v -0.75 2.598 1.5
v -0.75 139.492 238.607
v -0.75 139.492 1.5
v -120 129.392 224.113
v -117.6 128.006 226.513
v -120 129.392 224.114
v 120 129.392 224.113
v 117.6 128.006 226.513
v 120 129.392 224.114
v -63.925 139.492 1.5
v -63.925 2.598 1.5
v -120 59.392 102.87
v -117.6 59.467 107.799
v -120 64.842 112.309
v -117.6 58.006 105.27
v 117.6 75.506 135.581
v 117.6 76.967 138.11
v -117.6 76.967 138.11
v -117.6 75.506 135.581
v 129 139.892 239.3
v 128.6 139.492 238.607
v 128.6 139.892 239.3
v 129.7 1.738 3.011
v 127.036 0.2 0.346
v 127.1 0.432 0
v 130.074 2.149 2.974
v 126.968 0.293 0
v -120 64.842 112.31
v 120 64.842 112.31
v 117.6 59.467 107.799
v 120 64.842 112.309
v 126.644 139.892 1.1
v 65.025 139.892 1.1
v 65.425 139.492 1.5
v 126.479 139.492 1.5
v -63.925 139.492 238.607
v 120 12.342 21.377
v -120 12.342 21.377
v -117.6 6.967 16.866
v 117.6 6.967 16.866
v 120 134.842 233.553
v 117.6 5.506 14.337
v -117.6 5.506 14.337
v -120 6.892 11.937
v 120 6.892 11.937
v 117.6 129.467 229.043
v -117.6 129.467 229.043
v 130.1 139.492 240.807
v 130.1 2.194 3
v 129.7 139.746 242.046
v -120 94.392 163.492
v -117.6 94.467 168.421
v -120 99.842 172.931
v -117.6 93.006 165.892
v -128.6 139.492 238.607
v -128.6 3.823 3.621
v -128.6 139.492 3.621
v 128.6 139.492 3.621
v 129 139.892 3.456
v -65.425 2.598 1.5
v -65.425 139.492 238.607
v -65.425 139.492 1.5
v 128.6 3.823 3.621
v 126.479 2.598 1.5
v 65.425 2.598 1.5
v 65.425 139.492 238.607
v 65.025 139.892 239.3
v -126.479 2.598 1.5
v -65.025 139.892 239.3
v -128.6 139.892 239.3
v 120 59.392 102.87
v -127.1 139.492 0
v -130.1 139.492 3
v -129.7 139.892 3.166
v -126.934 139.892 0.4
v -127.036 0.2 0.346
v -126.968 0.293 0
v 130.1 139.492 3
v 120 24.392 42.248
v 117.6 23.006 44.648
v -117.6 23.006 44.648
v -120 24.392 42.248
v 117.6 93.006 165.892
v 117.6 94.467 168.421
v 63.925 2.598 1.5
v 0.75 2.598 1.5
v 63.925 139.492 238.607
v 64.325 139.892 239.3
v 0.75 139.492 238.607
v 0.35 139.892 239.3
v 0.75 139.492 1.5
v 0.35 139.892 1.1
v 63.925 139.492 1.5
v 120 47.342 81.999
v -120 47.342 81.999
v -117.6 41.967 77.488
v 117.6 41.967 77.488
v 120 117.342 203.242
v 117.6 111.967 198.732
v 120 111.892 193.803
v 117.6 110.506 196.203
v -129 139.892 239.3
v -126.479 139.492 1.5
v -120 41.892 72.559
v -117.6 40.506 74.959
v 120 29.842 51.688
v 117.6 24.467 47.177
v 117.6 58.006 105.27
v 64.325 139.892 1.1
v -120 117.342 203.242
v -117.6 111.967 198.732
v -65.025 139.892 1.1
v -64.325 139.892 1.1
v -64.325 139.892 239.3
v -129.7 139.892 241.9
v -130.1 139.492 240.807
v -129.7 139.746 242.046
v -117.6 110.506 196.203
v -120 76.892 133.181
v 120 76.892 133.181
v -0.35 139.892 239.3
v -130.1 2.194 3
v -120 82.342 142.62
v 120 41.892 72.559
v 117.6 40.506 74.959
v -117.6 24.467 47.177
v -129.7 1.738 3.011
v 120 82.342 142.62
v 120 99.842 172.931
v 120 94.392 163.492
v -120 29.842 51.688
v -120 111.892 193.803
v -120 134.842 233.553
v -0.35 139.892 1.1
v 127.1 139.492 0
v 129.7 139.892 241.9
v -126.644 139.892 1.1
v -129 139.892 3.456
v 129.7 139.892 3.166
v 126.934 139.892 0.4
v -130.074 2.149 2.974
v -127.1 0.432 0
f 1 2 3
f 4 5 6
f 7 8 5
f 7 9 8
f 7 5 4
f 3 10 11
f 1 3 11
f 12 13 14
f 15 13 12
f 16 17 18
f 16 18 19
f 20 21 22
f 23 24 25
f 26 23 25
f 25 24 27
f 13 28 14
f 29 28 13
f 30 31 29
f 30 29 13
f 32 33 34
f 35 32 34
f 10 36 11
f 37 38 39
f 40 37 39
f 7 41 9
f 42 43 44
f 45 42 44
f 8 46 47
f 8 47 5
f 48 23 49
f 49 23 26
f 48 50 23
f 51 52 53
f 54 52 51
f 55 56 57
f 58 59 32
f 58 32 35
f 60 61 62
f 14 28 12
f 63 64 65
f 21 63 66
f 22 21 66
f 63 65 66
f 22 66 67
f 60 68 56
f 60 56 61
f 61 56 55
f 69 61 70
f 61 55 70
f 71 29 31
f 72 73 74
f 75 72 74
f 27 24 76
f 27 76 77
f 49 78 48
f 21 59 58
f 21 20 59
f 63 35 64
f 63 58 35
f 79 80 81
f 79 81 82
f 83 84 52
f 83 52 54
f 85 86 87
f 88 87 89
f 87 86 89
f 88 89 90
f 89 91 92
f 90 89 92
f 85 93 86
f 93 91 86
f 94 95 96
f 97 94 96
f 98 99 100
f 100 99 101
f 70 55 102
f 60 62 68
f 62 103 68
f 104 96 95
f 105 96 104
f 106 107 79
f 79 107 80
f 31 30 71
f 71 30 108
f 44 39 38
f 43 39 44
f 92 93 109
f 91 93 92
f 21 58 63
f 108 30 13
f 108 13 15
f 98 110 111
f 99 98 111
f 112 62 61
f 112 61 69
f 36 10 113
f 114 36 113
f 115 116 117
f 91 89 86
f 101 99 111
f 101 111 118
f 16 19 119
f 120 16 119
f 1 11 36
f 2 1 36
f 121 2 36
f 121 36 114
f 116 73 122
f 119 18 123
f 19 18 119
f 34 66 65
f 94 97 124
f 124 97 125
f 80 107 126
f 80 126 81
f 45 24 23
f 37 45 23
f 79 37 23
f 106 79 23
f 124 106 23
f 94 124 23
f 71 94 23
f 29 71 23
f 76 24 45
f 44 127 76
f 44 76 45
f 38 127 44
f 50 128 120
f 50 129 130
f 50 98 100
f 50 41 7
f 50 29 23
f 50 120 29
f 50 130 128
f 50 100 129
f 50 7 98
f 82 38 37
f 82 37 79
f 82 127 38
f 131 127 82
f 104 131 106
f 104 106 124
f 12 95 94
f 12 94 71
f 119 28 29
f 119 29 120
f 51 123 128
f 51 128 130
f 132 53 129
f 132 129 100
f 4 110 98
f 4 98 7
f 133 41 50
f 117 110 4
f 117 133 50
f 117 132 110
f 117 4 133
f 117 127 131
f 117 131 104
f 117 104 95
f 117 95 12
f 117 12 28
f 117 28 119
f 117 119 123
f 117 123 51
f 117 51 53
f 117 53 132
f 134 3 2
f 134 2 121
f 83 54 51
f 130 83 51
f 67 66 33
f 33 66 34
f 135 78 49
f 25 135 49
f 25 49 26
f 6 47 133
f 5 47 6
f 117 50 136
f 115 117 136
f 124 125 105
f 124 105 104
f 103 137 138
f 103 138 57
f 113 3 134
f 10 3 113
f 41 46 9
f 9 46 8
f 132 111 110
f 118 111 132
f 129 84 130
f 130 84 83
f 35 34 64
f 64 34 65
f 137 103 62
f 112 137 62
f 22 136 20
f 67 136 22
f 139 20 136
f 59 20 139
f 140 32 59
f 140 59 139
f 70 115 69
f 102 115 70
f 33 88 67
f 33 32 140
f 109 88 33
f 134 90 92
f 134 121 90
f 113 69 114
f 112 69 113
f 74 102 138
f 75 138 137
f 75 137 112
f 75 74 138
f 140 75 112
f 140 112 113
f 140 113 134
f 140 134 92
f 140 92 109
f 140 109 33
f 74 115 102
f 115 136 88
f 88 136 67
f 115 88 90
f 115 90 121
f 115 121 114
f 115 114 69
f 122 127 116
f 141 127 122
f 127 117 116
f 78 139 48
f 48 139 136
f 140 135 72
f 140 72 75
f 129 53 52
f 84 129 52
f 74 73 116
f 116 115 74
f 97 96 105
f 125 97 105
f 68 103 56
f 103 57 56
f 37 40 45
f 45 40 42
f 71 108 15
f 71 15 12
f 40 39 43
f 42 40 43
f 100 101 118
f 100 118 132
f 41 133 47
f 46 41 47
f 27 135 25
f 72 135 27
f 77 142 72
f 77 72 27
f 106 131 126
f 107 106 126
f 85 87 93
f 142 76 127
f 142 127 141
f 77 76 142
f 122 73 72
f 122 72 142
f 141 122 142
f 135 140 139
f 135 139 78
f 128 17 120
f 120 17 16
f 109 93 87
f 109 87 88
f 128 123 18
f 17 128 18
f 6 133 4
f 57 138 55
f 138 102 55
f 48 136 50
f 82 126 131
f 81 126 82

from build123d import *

# Parameters (mm, degrees)
BOSS_EXTRUDE1_DEPTH                = 130.100001
BOSS_EXTRUDE1_DEPTH_BACK           = 130.100001
BACK_CORNER_CHAMS_SIZE             = 3
COMPARTMENT_T                      = -1.5
STACKER_RIB_DEPTH                  = 120.000001
STACKER_RIB_CHAM_SIZE              = 2.4
LPATTERN1_COUNT                    = 8
LPATTERN1_PITCH                    = 35
STACKER_RIB_CHAM_OF_LPATTERN1_SIZE = 2.4
CENTER_DIVIDER_DEPTH               = 0.75
F_4_COMPARTMENT_LEFT_DIVIDER_DEPTH = 0.75
F_4_COMPARTMENT_DEBURS_SIZE        = 0.4


# Some blends are built 0.0001 mm under size
with BuildPart() as part:
    # Sketch1 → Boss-Extrude1 (new, two sides: drawn at the far end of the back side and taken through both)
    with BuildSketch(Plane(origin=(0, 0, 0), x_dir=(0, 0, -1), z_dir=(1, 0, 0)).offset(-BOSS_EXTRUDE1_DEPTH_BACK)):
        Polygon((0, 139.891970225), (0, 0), (-242.3, 139.891970225), align=None)
    extrude(amount=BOSS_EXTRUDE1_DEPTH + BOSS_EXTRUDE1_DEPTH_BACK)

    # Back Corner Chams
    back_corner_chams_edges = [part.edges().sort_by_distance(p)[0] for p in [
        (-130.100001, 69.945985112, 0),
        (130.100001, 69.945985112, 0),
    ]]
    chamfer(back_corner_chams_edges, length=BACK_CORNER_CHAMS_SIZE)

    # Compartment
    compartment_openings = [part.faces().sort_by_distance(p)[0] for p in [
        (0, 139.891970225, 121.167154086),
    ]]
    offset(amount=COMPARTMENT_T, openings=compartment_openings, kind=Kind.INTERSECTION)

    # Sketch7 → Stacker Rib (add, symmetric)
    with BuildSketch(Plane(origin=(0, 0, 0), x_dir=(0, 0, -1), z_dir=(1, 0, 0))):
        Polygon((-233.553143422, 134.841970225), (-229.042618842, 129.466536352), (-226.513466521, 128.006329579), (-224.113466521, 129.391970225), align=None)
    stacker_rib = extrude(amount=STACKER_RIB_DEPTH, both=True)

    # Stacker Rib Cham
    stacker_rib_cham_edges = [part.edges().sort_by_distance(p)[0] for p in [
        (120.000001, 128.736432965, 227.778042681),
        (-120.000001, 128.736432965, 227.778042681),
    ]]
    chamfer(stacker_rib_cham_edges, length=STACKER_RIB_CHAM_SIZE - 0.0001)  # a hair under: the kernel refuses the full size

    # LPattern1: Stacker Rib ×8
    with Locations(*[Vector(-2.642697158742682e-15, -0.5000000000000042, -0.8660254037844363) * (i * LPATTERN1_PITCH) for i in range(1, LPATTERN1_COUNT)]):
        add(stacker_rib)

    # Stacker Rib Cham of LPattern1
    stacker_rib_cham_of_lpattern1_edges = [part.edges().sort_by_distance(p)[0] for p in [
        (120.000001, 111.236432965, 197.467153549),
        (-120.000001, 111.236432965, 197.467153549),
        (120.000001, 93.736432965, 167.156264416),
        (-120.000001, 93.736432965, 167.156264416),
        (120.000001, 76.236432965, 136.845375284),
        (-120.000001, 76.236432965, 136.845375284),
        (120.000001, 58.736432965, 106.534486151),
        (-120.000001, 58.736432965, 106.534486151),
        (120.000001, 41.236432965, 76.223597019),
        (-120.000001, 41.236432965, 76.223597019),
        (120.000001, 23.736432965, 45.912707887),
        (-120.000001, 23.736432965, 45.912707887),
        (120.000001, 6.236432965, 15.601818754),
        (-120.000001, 6.236432965, 15.601818754),
    ]]
    chamfer(stacker_rib_cham_of_lpattern1_edges, length=STACKER_RIB_CHAM_OF_LPATTERN1_SIZE - 0.0001)  # a hair under: the kernel refuses the full size

    # Sketch3 → Center Divider (add, symmetric)
    with BuildSketch(Plane(origin=(0, 0, 0), x_dir=(0, 0, -1), z_dir=(1, 0, 0))):
        Polygon((0, 0), (0, 139.891970225), (-242.3, 139.891970225), align=None)
    extrude(amount=CENTER_DIVIDER_DEPTH, both=True)

    # Sketch6 → 4 Compartment Left Divider (add, symmetric)
    with BuildSketch(Plane(origin=(-64.67500064, 0, 0), x_dir=(0, 0, -1), z_dir=(1, 0, 0))):
        Polygon((0, 0), (0, 139.891970225), (-242.3, 139.891970225), align=None)
    f_4_compartment_left_divider = extrude(amount=F_4_COMPARTMENT_LEFT_DIVIDER_DEPTH, both=True)

    # 4 Compartment Right Divider: 4 Compartment Left Divider across plane
    add(f_4_compartment_left_divider.mirror(Plane(origin=(0, 0, 0), x_dir=(0, 0, 1), z_dir=(1, 0, 0))))

    # Body Deburs
    # the kernel refuses this chamfer: 0.4, 0.310325843, 0.292820323 mm, written as the material it takes off along each edge
    with BuildSketch(Plane(origin=(129.833334333, 139.709833504, 241.584529946), x_dir=(0.30151134457777734, -0.1911505329331018, -0.9341051240895171), z_dir=(0.9351131265310314, 0.25056280708570355, 0.25056280708575224))) as body_deburs_piece_1:
        Polygon((-0.478475339, -0.058726892), (0.848174577, -0.058726892), (-0.369699238, 0.117453784), align=None)
    extrude(amount=0.521697411, mode=Mode.SUBTRACT)
    with BuildSketch(Plane(origin=(-129.833334333, 139.709833504, 241.584529946), x_dir=(-0.30151134457777734, -0.1911505329331018, -0.9341051240895171), z_dir=(-0.9351131265310314, 0.25056280708570355, 0.25056280708575224))) as body_deburs_piece_2:
        Polygon((-0.478475339, 0.058726892), (0.848174577, 0.058726892), (-0.369699238, -0.117453784), align=None)
    extrude(amount=0.521697411, mode=Mode.SUBTRACT)
    with BuildSketch(Plane(origin=(127.507353852, 139.891970225, 1.5), x_dir=(0, 0.02749587661059753, -0.9996219169112964), z_dir=(-1, 0, 0))) as body_deburs_piece_3_section:
        with BuildLine():
            Line((0.411469278, 0), (-0.022618862, 0.410847117))
            Line((-0.022618862, 0.410847117), (-0.030615837, 0.41062715))
            ThreePointArc((-0.030615837, 0.41062715), (-0.013651691, 0.205359132), (-0.007996975, -0.000219967))
            Line((-0.007996975, -0.000219967), (0.000219967, -0.007996975))
            ThreePointArc((0.000219967, -0.007996975), (0.205799066, -0.00234226), (0.411689245, -0.007996975))
            Line((0.411689245, -0.007996975), (0.411469278, 0))
        make_face()
    body_deburs_piece_3 = extrude(amount=62.082353212, mode=Mode.PRIVATE)
    body_deburs_piece_3 = split(body_deburs_piece_3, bisect_by=Plane(origin=(111.116447648, 139.759963614, -13.862233009), z_dir=(-0.7071067811865476, 0, 0.7071067811865476)), keep=Keep.TOP, mode=Mode.PRIVATE)
    add(body_deburs_piece_3, mode=Mode.SUBTRACT)
    with BuildSketch(Plane(origin=(125.751298864, 139.891970225, 0.772618208), x_dir=(0.7068394360706732, 0.027495876610596933, -0.7068394360706733), z_dir=(0.7071067811865476, 0, 0.7071067811865476))) as body_deburs_piece_4_section:
        with BuildLine():
            Line((0.411469278, 0), (-0.022618862, -0.410847117))
            Line((-0.022618862, -0.410847117), (-0.030615837, -0.41062715))
            ThreePointArc((-0.030615837, -0.41062715), (-0.013651691, -0.205359132), (-0.007996975, 0.000219967))
            Line((-0.007996975, 0.000219967), (0.000219967, 0.007996975))
            ThreePointArc((0.000219967, 0.007996975), (0.205799066, 0.00234226), (0.411689245, 0.007996975))
            Line((0.411689245, 0.007996975), (0.411469278, 0))
        make_face()
    body_deburs_piece_4 = extrude(amount=5.05734639, mode=Mode.PRIVATE)
    body_deburs_piece_4 = split(body_deburs_piece_4, bisect_by=Plane(origin=(128.600001, 139.756082402, 2.472631953), z_dir=(-1, 0, 0)), keep=Keep.TOP, mode=Mode.PRIVATE)
    body_deburs_piece_4 = split(body_deburs_piece_4, bisect_by=Plane(origin=(127.627369047, 139.756082402, 1.5), z_dir=(0, 0, 1)), keep=Keep.TOP, mode=Mode.PRIVATE)
    add(body_deburs_piece_4, mode=Mode.SUBTRACT)
    with BuildSketch(Plane(origin=(128.600001, 139.891970225, 2.592647148), x_dir=(0.9996219169112964, 0.027495876610595334, 0), z_dir=(0, 0, 1))) as body_deburs_piece_5_section:
        with BuildLine():
            Line((0.411469278, 0), (-0.022618862, -0.410847117))
            Line((-0.022618862, -0.410847117), (-0.030615837, -0.41062715))
            ThreePointArc((-0.030615837, -0.41062715), (-0.013651691, -0.205359132), (-0.007996975, 0.000219967))
            Line((-0.007996975, 0.000219967), (0.000219967, 0.007996975))
            ThreePointArc((0.000219967, 0.007996975), (0.205799066, 0.00234226), (0.411689245, 0.007996975))
            Line((0.411689245, 0.007996975), (0.411469278, 0))
        make_face()
    body_deburs_piece_5 = extrude(amount=237.736026047, mode=Mode.PRIVATE)
    body_deburs_piece_5 = split(body_deburs_piece_5, bisect_by=Plane(origin=(128.731915254, 88.812183478, 150.827214114), z_dir=(0, 0.8660254037844364, -0.5000000000000039)), keep=Keep.TOP, mode=Mode.PRIVATE)
    body_deburs_piece_5 = split(body_deburs_piece_5, bisect_by=Plane(origin=(187.561507061, 139.760104476, 62.582826404), z_dir=(-0.7071067811865476, 0, 0.7071067811865476)), keep=Keep.TOP, mode=Mode.PRIVATE)
    add(body_deburs_piece_5, mode=Mode.SUBTRACT)
    with BuildSketch(Plane(origin=(-125.751298864, 139.891970225, 0.772618208), x_dir=(-0.7068394360706732, 0.027495876610596933, -0.7068394360706733), z_dir=(-0.7071067811865476, 0, 0.7071067811865476))) as body_deburs_piece_6_section:
        with BuildLine():
            Line((0.411469278, 0), (-0.022618862, 0.410847117))
            Line((-0.022618862, 0.410847117), (-0.030615837, 0.41062715))
            ThreePointArc((-0.030615837, 0.41062715), (-0.013651691, 0.205359132), (-0.007996975, -0.000219967))
            Line((-0.007996975, -0.000219967), (0.000219967, -0.007996975))
            ThreePointArc((0.000219967, -0.007996975), (0.205799066, -0.00234226), (0.411689245, -0.007996975))
            Line((0.411689245, -0.007996975), (0.411469278, 0))
        make_face()
    body_deburs_piece_6 = extrude(amount=5.05734639, mode=Mode.PRIVATE)
    body_deburs_piece_6 = split(body_deburs_piece_6, bisect_by=Plane(origin=(-128.600001, 139.756082402, 2.472631953), z_dir=(1, 0, 0)), keep=Keep.TOP, mode=Mode.PRIVATE)
    body_deburs_piece_6 = split(body_deburs_piece_6, bisect_by=Plane(origin=(-127.627369047, 139.756082402, 1.5), z_dir=(0, 0, 1)), keep=Keep.TOP, mode=Mode.PRIVATE)
    add(body_deburs_piece_6, mode=Mode.SUBTRACT)
    with BuildSketch(Plane(origin=(-128.600001, 139.891970225, 2.592647148), x_dir=(-0.9996219169112964, 0.027495876610595334, 0), z_dir=(0, 0, 1))) as body_deburs_piece_7_section:
        with BuildLine():
            Line((0.411469278, 0), (-0.022618862, 0.410847117))
            Line((-0.022618862, 0.410847117), (-0.030615837, 0.41062715))
            ThreePointArc((-0.030615837, 0.41062715), (-0.013651691, 0.205359132), (-0.007996975, -0.000219967))
            Line((-0.007996975, -0.000219967), (0.000219967, -0.007996975))
            ThreePointArc((0.000219967, -0.007996975), (0.205799066, -0.00234226), (0.411689245, -0.007996975))
            Line((0.411689245, -0.007996975), (0.411469278, 0))
        make_face()
    body_deburs_piece_7 = extrude(amount=237.736026047, mode=Mode.PRIVATE)
    body_deburs_piece_7 = split(body_deburs_piece_7, bisect_by=Plane(origin=(-128.731915254, 88.812183478, 150.827214114), z_dir=(0, 0.8660254037844364, -0.5000000000000039)), keep=Keep.TOP, mode=Mode.PRIVATE)
    body_deburs_piece_7 = split(body_deburs_piece_7, bisect_by=Plane(origin=(-187.561507061, 139.760104476, 62.582826404), z_dir=(0.7071067811865476, 0, 0.7071067811865476)), keep=Keep.TOP, mode=Mode.PRIVATE)
    add(body_deburs_piece_7, mode=Mode.SUBTRACT)
    with BuildSketch(Plane(origin=(130.100001, 1.21771421, 2.109142881), x_dir=(-0.9996219169112966, -0.02381212764408988, 0.013747938305293163), z_dir=(0, 0.5000000000000039, 0.8660254037844364))) as body_deburs_piece_8:
        with BuildLine():
            Line((0.411469278, 0), (-0.022618862, -0.410847117))
            Line((-0.022618862, -0.410847117), (-0.030615837, -0.41062715))
            ThreePointArc((-0.030615837, -0.41062715), (-0.013651691, -0.205359132), (-0.007996975, 0.000219967))
            Line((-0.007996975, 0.000219967), (0.000219967, 0.007996975))
            ThreePointArc((0.000219967, 0.007996975), (0.205799066, 0.00234226), (0.411689245, 0.007996975))
            Line((0.411689245, 0.007996975), (0.411469278, 0))
        make_face()
    extrude(amount=278.377185225, mode=Mode.SUBTRACT)
    with BuildSketch(Plane(origin=(130.100001, 139.891970225, 243.328673195), x_dir=(-0.9996219169112964, 0.027495876610595334, 0), z_dir=(0, 0, -1)), Plane(origin=(-130.100001, 139.891970225, 243.328673195), x_dir=(-0.027495876610595337, -0.9996219169112965, 0), z_dir=(0, 0, -1))) as body_deburs_piece_9:
        with BuildLine():
            Line((0.411469278, 0), (-0.022618862, -0.410847117))
            Line((-0.022618862, -0.410847117), (-0.030615837, -0.41062715))
            ThreePointArc((-0.030615837, -0.41062715), (-0.013651691, -0.205359132), (-0.007996975, 0.000219967))
            Line((-0.007996975, 0.000219967), (0.000219967, 0.007996975))
            ThreePointArc((0.000219967, 0.007996975), (0.205799066, 0.00234226), (0.411689245, 0.007996975))
            Line((0.411689245, 0.007996975), (0.411469278, 0))
        make_face()
    extrude(amount=241.35734639, mode=Mode.SUBTRACT)
    with BuildSketch(Plane(origin=(126.372619208, 139.891970225, -0.727381792), x_dir=(-0.7068394360706732, 0.027495876610595566, 0.7068394360706733), z_dir=(0.7071067811865476, 0, 0.7071067811865476)), Plane(origin=(-126.372619208, 139.891970225, -0.727381792), x_dir=(-0.01944252080601816, -0.9996219169112965, -0.019442520806018278), z_dir=(-0.7071067811865476, 0, 0.7071067811865476))) as body_deburs_piece_10:
        with BuildLine():
            Line((0.411469278, 0), (-0.022618862, 0.410847117))
            Line((-0.022618862, 0.410847117), (-0.030615837, 0.41062715))
            ThreePointArc((-0.030615837, 0.41062715), (-0.013651691, 0.205359132), (-0.007996975, -0.000219967))
            Line((-0.007996975, -0.000219967), (0.000219967, -0.007996975))
            ThreePointArc((0.000219967, -0.007996975), (0.205799066, -0.00234226), (0.411689245, -0.007996975))
            Line((0.411689245, -0.007996975), (0.411469278, 0))
        make_face()
    extrude(amount=6.299987077, mode=Mode.SUBTRACT)
    with BuildSketch(Plane(origin=(-128.128674195, 139.891970225, 0), x_dir=(0, -0.9996219169112966, -0.027495876610585723), z_dir=(1, 0, 0))) as body_deburs_piece_11:
        with BuildLine():
            Line((0.411469278, 0), (-0.022618862, -0.410847117))
            Line((-0.022618862, -0.410847117), (-0.030615837, -0.41062715))
            ThreePointArc((-0.030615837, -0.41062715), (-0.013651691, -0.205359132), (-0.007996975, 0.000219967))
            Line((-0.007996975, 0.000219967), (0.000219967, 0.007996975))
            ThreePointArc((0.000219967, 0.007996975), (0.205799066, 0.00234226), (0.411689245, 0.007996975))
            Line((0.411689245, 0.007996975), (0.411469278, 0))
        make_face()
    extrude(amount=256.25734839, mode=Mode.SUBTRACT)
    with BuildSketch(Plane(origin=(-130.100001, 1.21771421, 2.109142881), x_dir=(0.9996219169112966, -0.02381212764408988, 0.013747938305293163), z_dir=(0, 0.5000000000000039, 0.8660254037844364))) as body_deburs_piece_12:
        with BuildLine():
            Line((0.411469278, 0), (-0.022618862, 0.410847117))
            Line((-0.022618862, 0.410847117), (-0.030615837, 0.41062715))
            ThreePointArc((-0.030615837, 0.41062715), (-0.013651691, 0.205359132), (-0.007996975, -0.000219967))
            Line((-0.007996975, -0.000219967), (0.000219967, -0.007996975))
            ThreePointArc((0.000219967, -0.007996975), (0.205799066, -0.00234226), (0.411689245, -0.007996975))
            Line((0.411689245, -0.007996975), (0.411469278, 0))
        make_face()
    extrude(amount=278.377185225, mode=Mode.SUBTRACT)
    with BuildSketch(Plane(origin=(131.128674195, 139.891970225, 242.3), x_dir=(0, -0.5455824869680519, -0.8380571280728751), z_dir=(-1, 0, 0))) as body_deburs_piece_13:
        with BuildLine():
            Line((0.289092619, 0), (0.338531824, -0.23388709))
            Line((0.338531824, -0.23388709), (0.334167164, -0.240591547))
            ThreePointArc((0.334167164, -0.240591547), (0.167987533, -0.118907235), (-0.00436466, -0.006704457))
            Line((-0.00436466, -0.006704457), (0.000427678, 0.00798856))
            ThreePointArc((0.000427678, 0.00798856), (0.144560882, 0.000272204), (0.289520297, 0.00798856))
            Line((0.289520297, 0.00798856), (0.289092619, 0))
        make_face()
    extrude(amount=262.25734839, mode=Mode.SUBTRACT)
    with BuildSketch(Plane(origin=(126.426576317, -0.388801922, -0.673424683), x_dir=(-0.7551298715314874, 0.28717157801696425, 0.5893312836597817), z_dir=(0.6546536707079762, 0.3779644730092306, 0.6546536707079762))) as body_deburs_piece_14:
        with BuildLine():
            Line((0.3172442, 0), (0.116825908, -0.394536024))
            Line((0.116825908, -0.394536024), (0.109220487, -0.39701747))
            ThreePointArc((0.109220487, -0.39701747), (0.056185378, -0.197994811), (-0.007605421, -0.002481446))
            Line((-0.007605421, -0.002481446), (0.000367742, 0.007991543))
            ThreePointArc((0.000367742, 0.007991543), (0.158654668, 0.000707748), (0.317611942, 0.007991543))
            Line((0.317611942, 0.007991543), (0.3172442, 0))
        make_face()
    extrude(amount=6.639922085, mode=Mode.SUBTRACT)
    with BuildSketch(Plane(origin=(-126.426576317, -0.388801922, -0.673424683), x_dir=(0.7551298715314874, 0.2871715780169642, 0.5893312836597817), z_dir=(-0.6546536707079762, 0.3779644730092306, 0.6546536707079762))) as body_deburs_piece_15:
        with BuildLine():
            Line((0.3172442, 0), (0.116825908, 0.394536024))
            Line((0.116825908, 0.394536024), (0.109220487, 0.39701747))
            ThreePointArc((0.109220487, 0.39701747), (0.056185378, 0.197994811), (-0.007605421, 0.002481446))
            Line((-0.007605421, 0.002481446), (0.000367742, -0.007991543))
            ThreePointArc((0.000367742, -0.007991543), (0.158654668, -0.000707748), (0.317611942, -0.007991543))
            Line((0.317611942, -0.007991543), (0.3172442, 0))
        make_face()
    extrude(amount=6.639922085, mode=Mode.SUBTRACT)
    with BuildSketch(Plane(origin=(-128.128674195, 0, 0), x_dir=(0, 0.47599883081156275, 0.879445912530171), z_dir=(1, 0, 0))) as body_deburs_piece_16:
        with BuildLine():
            Line((0.411469278, 0), (0.12776162, -0.268517987))
            Line((0.12776162, -0.268517987), (0.120726053, -0.272325977))
            ThreePointArc((0.120726053, -0.272325977), (0.063641079, -0.134388748), (-0.007035567, -0.003807991))
            Line((-0.007035567, -0.003807991), (0.000219967, 0.007996975))
            ThreePointArc((0.000219967, 0.007996975), (0.205799066, 0.00234226), (0.411689245, 0.007996975))
            Line((0.411689245, 0.007996975), (0.411469278, 0))
        make_face()
    extrude(amount=256.25734839, mode=Mode.SUBTRACT)
    with BuildSketch(Plane(origin=(127.507353852, 139.891970225, 1.5), x_dir=(0, 0.02749587661059753, -0.9996219169112964), z_dir=(-1, 0, 0))) as body_deburs_piece_17a_section:
        with BuildLine():
            Line((0.411469278, 0), (-0.022618862, 0.410847117))
            Line((-0.022618862, 0.410847117), (-0.030615837, 0.41062715))
            ThreePointArc((-0.030615837, 0.41062715), (-0.013651691, 0.205359132), (-0.007996975, -0.000219967))
            Line((-0.007996975, -0.000219967), (0.000219967, -0.007996975))
            ThreePointArc((0.000219967, -0.007996975), (0.205799066, -0.00234226), (0.411689245, -0.007996975))
            Line((0.411689245, -0.007996975), (0.411469278, 0))
        make_face()
    body_deburs_piece_17a = extrude(amount=62.082353212, mode=Mode.PRIVATE)
    body_deburs_piece_17a = split(body_deburs_piece_17a, bisect_by=Plane(origin=(126.630344982, 139.764732975, 1.651664325), z_dir=(0.7071067811865476, 0, -0.7071067811865476)), keep=Keep.TOP, mode=Mode.PRIVATE)
    with BuildSketch(Plane(origin=(125.751298864, 139.891970225, 0.772618208), x_dir=(0.7068394360706732, 0.027495876610596933, -0.7068394360706733), z_dir=(0.7071067811865476, 0, 0.7071067811865476))) as body_deburs_piece_17b_section:
        with BuildLine():
            Line((0.411469278, 0), (-0.022618862, -0.410847117))
            Line((-0.022618862, -0.410847117), (-0.030615837, -0.41062715))
            ThreePointArc((-0.030615837, -0.41062715), (-0.013651691, -0.205359132), (-0.007996975, 0.000219967))
            Line((-0.007996975, 0.000219967), (0.000219967, 0.007996975))
            ThreePointArc((0.000219967, 0.007996975), (0.205799066, 0.00234226), (0.411689245, 0.007996975))
            Line((0.411689245, 0.007996975), (0.411469278, 0))
        make_face()
    body_deburs_piece_17b = extrude(amount=5.05734639, mode=Mode.PRIVATE)
    body_deburs_piece_17b = split(body_deburs_piece_17b, bisect_by=Plane(origin=(126.264194911, 139.764732975, 1.5), z_dir=(0, 0, -1)), keep=Keep.TOP, mode=Mode.PRIVATE)
    body_deburs_piece_17 = body_deburs_piece_17a & body_deburs_piece_17b
    add(body_deburs_piece_17, mode=Mode.SUBTRACT)
    with BuildSketch(Plane(origin=(125.751298864, 139.891970225, 0.772618208), x_dir=(0.7068394360706732, 0.027495876610596933, -0.7068394360706733), z_dir=(0.7071067811865476, 0, 0.7071067811865476))) as body_deburs_piece_18a_section:
        with BuildLine():
            Line((0.411469278, 0), (-0.022618862, -0.410847117))
            Line((-0.022618862, -0.410847117), (-0.030615837, -0.41062715))
            ThreePointArc((-0.030615837, -0.41062715), (-0.013651691, -0.205359132), (-0.007996975, 0.000219967))
            Line((-0.007996975, 0.000219967), (0.000219967, 0.007996975))
            ThreePointArc((0.000219967, 0.007996975), (0.205799066, 0.00234226), (0.411689245, 0.007996975))
            Line((0.411689245, 0.007996975), (0.411469278, 0))
        make_face()
    body_deburs_piece_18a = extrude(amount=5.05734639, mode=Mode.PRIVATE)
    body_deburs_piece_18a = split(body_deburs_piece_18a, bisect_by=Plane(origin=(128.600001, 139.764732975, 3.835806089), z_dir=(1, 0, 0)), keep=Keep.TOP, mode=Mode.PRIVATE)
    with BuildSketch(Plane(origin=(128.600001, 139.891970225, 2.592647148), x_dir=(0.9996219169112964, 0.027495876610595334, 0), z_dir=(0, 0, 1))) as body_deburs_piece_18b_section:
        with BuildLine():
            Line((0.411469278, 0), (-0.022618862, -0.410847117))
            Line((-0.022618862, -0.410847117), (-0.030615837, -0.41062715))
            ThreePointArc((-0.030615837, -0.41062715), (-0.013651691, -0.205359132), (-0.007996975, 0.000219967))
            Line((-0.007996975, 0.000219967), (0.000219967, 0.007996975))
            ThreePointArc((0.000219967, 0.007996975), (0.205799066, 0.00234226), (0.411689245, 0.007996975))
            Line((0.411689245, 0.007996975), (0.411469278, 0))
        make_face()
    body_deburs_piece_18b = extrude(amount=237.736026047, mode=Mode.PRIVATE)
    body_deburs_piece_18b = split(body_deburs_piece_18b, bisect_by=Plane(origin=(128.448336675, 139.764732975, 3.469656018), z_dir=(0.7071067811865476, 0, -0.7071067811865476)), keep=Keep.TOP, mode=Mode.PRIVATE)
    body_deburs_piece_18 = body_deburs_piece_18a & body_deburs_piece_18b
    add(body_deburs_piece_18, mode=Mode.SUBTRACT)
    with BuildSketch(Plane(origin=(-125.751298864, 139.891970225, 0.772618208), x_dir=(-0.7068394360706732, 0.027495876610596933, -0.7068394360706733), z_dir=(-0.7071067811865476, 0, 0.7071067811865476))) as body_deburs_piece_19a_section:
        with BuildLine():
            Line((0.411469278, 0), (-0.022618862, 0.410847117))
            Line((-0.022618862, 0.410847117), (-0.030615837, 0.41062715))
            ThreePointArc((-0.030615837, 0.41062715), (-0.013651691, 0.205359132), (-0.007996975, -0.000219967))
            Line((-0.007996975, -0.000219967), (0.000219967, -0.007996975))
            ThreePointArc((0.000219967, -0.007996975), (0.205799066, -0.00234226), (0.411689245, -0.007996975))
            Line((0.411689245, -0.007996975), (0.411469278, 0))
        make_face()
    body_deburs_piece_19a = extrude(amount=5.05734639, mode=Mode.PRIVATE)
    body_deburs_piece_19a = split(body_deburs_piece_19a, bisect_by=Plane(origin=(-128.600001, 139.764732975, 3.835806089), z_dir=(-1, 0, 0)), keep=Keep.TOP, mode=Mode.PRIVATE)
    with BuildSketch(Plane(origin=(-128.600001, 139.891970225, 2.592647148), x_dir=(-0.9996219169112964, 0.027495876610595334, 0), z_dir=(0, 0, 1))) as body_deburs_piece_19b_section:
        with BuildLine():
            Line((0.411469278, 0), (-0.022618862, 0.410847117))
            Line((-0.022618862, 0.410847117), (-0.030615837, 0.41062715))
            ThreePointArc((-0.030615837, 0.41062715), (-0.013651691, 0.205359132), (-0.007996975, -0.000219967))
            Line((-0.007996975, -0.000219967), (0.000219967, -0.007996975))
            ThreePointArc((0.000219967, -0.007996975), (0.205799066, -0.00234226), (0.411689245, -0.007996975))
            Line((0.411689245, -0.007996975), (0.411469278, 0))
        make_face()
    body_deburs_piece_19b = extrude(amount=237.736026047, mode=Mode.PRIVATE)
    body_deburs_piece_19b = split(body_deburs_piece_19b, bisect_by=Plane(origin=(-128.448336675, 139.764732975, 3.469656018), z_dir=(-0.7071067811865476, 0, -0.7071067811865476)), keep=Keep.TOP, mode=Mode.PRIVATE)
    body_deburs_piece_19 = body_deburs_piece_19a & body_deburs_piece_19b
    add(body_deburs_piece_19, mode=Mode.SUBTRACT)

    # 4 Compartment Deburs
    f_4_compartment_deburs_edges = [part.edges().sort_by_distance(p)[0] for p in [
        (65.42500064, 139.891970225, 120.2),
        (63.92500064, 139.891970225, 120.4),
        (32.33750032, 139.891970225, 1.5),
        (0.75, 139.891970225, 120.4),
        (-0.75, 139.891970225, 120.4),
        (-63.92500064, 139.891970225, 120.4),
        (-32.33750032, 139.891970225, 1.5),
        (-65.42500064, 139.891970225, 120.4),
        (-96.234683361, 139.891970225, 1.5),
    ]]
    chamfer(f_4_compartment_deburs_edges, length=F_4_COMPARTMENT_DEBURS_SIZE)


solid = part.part
